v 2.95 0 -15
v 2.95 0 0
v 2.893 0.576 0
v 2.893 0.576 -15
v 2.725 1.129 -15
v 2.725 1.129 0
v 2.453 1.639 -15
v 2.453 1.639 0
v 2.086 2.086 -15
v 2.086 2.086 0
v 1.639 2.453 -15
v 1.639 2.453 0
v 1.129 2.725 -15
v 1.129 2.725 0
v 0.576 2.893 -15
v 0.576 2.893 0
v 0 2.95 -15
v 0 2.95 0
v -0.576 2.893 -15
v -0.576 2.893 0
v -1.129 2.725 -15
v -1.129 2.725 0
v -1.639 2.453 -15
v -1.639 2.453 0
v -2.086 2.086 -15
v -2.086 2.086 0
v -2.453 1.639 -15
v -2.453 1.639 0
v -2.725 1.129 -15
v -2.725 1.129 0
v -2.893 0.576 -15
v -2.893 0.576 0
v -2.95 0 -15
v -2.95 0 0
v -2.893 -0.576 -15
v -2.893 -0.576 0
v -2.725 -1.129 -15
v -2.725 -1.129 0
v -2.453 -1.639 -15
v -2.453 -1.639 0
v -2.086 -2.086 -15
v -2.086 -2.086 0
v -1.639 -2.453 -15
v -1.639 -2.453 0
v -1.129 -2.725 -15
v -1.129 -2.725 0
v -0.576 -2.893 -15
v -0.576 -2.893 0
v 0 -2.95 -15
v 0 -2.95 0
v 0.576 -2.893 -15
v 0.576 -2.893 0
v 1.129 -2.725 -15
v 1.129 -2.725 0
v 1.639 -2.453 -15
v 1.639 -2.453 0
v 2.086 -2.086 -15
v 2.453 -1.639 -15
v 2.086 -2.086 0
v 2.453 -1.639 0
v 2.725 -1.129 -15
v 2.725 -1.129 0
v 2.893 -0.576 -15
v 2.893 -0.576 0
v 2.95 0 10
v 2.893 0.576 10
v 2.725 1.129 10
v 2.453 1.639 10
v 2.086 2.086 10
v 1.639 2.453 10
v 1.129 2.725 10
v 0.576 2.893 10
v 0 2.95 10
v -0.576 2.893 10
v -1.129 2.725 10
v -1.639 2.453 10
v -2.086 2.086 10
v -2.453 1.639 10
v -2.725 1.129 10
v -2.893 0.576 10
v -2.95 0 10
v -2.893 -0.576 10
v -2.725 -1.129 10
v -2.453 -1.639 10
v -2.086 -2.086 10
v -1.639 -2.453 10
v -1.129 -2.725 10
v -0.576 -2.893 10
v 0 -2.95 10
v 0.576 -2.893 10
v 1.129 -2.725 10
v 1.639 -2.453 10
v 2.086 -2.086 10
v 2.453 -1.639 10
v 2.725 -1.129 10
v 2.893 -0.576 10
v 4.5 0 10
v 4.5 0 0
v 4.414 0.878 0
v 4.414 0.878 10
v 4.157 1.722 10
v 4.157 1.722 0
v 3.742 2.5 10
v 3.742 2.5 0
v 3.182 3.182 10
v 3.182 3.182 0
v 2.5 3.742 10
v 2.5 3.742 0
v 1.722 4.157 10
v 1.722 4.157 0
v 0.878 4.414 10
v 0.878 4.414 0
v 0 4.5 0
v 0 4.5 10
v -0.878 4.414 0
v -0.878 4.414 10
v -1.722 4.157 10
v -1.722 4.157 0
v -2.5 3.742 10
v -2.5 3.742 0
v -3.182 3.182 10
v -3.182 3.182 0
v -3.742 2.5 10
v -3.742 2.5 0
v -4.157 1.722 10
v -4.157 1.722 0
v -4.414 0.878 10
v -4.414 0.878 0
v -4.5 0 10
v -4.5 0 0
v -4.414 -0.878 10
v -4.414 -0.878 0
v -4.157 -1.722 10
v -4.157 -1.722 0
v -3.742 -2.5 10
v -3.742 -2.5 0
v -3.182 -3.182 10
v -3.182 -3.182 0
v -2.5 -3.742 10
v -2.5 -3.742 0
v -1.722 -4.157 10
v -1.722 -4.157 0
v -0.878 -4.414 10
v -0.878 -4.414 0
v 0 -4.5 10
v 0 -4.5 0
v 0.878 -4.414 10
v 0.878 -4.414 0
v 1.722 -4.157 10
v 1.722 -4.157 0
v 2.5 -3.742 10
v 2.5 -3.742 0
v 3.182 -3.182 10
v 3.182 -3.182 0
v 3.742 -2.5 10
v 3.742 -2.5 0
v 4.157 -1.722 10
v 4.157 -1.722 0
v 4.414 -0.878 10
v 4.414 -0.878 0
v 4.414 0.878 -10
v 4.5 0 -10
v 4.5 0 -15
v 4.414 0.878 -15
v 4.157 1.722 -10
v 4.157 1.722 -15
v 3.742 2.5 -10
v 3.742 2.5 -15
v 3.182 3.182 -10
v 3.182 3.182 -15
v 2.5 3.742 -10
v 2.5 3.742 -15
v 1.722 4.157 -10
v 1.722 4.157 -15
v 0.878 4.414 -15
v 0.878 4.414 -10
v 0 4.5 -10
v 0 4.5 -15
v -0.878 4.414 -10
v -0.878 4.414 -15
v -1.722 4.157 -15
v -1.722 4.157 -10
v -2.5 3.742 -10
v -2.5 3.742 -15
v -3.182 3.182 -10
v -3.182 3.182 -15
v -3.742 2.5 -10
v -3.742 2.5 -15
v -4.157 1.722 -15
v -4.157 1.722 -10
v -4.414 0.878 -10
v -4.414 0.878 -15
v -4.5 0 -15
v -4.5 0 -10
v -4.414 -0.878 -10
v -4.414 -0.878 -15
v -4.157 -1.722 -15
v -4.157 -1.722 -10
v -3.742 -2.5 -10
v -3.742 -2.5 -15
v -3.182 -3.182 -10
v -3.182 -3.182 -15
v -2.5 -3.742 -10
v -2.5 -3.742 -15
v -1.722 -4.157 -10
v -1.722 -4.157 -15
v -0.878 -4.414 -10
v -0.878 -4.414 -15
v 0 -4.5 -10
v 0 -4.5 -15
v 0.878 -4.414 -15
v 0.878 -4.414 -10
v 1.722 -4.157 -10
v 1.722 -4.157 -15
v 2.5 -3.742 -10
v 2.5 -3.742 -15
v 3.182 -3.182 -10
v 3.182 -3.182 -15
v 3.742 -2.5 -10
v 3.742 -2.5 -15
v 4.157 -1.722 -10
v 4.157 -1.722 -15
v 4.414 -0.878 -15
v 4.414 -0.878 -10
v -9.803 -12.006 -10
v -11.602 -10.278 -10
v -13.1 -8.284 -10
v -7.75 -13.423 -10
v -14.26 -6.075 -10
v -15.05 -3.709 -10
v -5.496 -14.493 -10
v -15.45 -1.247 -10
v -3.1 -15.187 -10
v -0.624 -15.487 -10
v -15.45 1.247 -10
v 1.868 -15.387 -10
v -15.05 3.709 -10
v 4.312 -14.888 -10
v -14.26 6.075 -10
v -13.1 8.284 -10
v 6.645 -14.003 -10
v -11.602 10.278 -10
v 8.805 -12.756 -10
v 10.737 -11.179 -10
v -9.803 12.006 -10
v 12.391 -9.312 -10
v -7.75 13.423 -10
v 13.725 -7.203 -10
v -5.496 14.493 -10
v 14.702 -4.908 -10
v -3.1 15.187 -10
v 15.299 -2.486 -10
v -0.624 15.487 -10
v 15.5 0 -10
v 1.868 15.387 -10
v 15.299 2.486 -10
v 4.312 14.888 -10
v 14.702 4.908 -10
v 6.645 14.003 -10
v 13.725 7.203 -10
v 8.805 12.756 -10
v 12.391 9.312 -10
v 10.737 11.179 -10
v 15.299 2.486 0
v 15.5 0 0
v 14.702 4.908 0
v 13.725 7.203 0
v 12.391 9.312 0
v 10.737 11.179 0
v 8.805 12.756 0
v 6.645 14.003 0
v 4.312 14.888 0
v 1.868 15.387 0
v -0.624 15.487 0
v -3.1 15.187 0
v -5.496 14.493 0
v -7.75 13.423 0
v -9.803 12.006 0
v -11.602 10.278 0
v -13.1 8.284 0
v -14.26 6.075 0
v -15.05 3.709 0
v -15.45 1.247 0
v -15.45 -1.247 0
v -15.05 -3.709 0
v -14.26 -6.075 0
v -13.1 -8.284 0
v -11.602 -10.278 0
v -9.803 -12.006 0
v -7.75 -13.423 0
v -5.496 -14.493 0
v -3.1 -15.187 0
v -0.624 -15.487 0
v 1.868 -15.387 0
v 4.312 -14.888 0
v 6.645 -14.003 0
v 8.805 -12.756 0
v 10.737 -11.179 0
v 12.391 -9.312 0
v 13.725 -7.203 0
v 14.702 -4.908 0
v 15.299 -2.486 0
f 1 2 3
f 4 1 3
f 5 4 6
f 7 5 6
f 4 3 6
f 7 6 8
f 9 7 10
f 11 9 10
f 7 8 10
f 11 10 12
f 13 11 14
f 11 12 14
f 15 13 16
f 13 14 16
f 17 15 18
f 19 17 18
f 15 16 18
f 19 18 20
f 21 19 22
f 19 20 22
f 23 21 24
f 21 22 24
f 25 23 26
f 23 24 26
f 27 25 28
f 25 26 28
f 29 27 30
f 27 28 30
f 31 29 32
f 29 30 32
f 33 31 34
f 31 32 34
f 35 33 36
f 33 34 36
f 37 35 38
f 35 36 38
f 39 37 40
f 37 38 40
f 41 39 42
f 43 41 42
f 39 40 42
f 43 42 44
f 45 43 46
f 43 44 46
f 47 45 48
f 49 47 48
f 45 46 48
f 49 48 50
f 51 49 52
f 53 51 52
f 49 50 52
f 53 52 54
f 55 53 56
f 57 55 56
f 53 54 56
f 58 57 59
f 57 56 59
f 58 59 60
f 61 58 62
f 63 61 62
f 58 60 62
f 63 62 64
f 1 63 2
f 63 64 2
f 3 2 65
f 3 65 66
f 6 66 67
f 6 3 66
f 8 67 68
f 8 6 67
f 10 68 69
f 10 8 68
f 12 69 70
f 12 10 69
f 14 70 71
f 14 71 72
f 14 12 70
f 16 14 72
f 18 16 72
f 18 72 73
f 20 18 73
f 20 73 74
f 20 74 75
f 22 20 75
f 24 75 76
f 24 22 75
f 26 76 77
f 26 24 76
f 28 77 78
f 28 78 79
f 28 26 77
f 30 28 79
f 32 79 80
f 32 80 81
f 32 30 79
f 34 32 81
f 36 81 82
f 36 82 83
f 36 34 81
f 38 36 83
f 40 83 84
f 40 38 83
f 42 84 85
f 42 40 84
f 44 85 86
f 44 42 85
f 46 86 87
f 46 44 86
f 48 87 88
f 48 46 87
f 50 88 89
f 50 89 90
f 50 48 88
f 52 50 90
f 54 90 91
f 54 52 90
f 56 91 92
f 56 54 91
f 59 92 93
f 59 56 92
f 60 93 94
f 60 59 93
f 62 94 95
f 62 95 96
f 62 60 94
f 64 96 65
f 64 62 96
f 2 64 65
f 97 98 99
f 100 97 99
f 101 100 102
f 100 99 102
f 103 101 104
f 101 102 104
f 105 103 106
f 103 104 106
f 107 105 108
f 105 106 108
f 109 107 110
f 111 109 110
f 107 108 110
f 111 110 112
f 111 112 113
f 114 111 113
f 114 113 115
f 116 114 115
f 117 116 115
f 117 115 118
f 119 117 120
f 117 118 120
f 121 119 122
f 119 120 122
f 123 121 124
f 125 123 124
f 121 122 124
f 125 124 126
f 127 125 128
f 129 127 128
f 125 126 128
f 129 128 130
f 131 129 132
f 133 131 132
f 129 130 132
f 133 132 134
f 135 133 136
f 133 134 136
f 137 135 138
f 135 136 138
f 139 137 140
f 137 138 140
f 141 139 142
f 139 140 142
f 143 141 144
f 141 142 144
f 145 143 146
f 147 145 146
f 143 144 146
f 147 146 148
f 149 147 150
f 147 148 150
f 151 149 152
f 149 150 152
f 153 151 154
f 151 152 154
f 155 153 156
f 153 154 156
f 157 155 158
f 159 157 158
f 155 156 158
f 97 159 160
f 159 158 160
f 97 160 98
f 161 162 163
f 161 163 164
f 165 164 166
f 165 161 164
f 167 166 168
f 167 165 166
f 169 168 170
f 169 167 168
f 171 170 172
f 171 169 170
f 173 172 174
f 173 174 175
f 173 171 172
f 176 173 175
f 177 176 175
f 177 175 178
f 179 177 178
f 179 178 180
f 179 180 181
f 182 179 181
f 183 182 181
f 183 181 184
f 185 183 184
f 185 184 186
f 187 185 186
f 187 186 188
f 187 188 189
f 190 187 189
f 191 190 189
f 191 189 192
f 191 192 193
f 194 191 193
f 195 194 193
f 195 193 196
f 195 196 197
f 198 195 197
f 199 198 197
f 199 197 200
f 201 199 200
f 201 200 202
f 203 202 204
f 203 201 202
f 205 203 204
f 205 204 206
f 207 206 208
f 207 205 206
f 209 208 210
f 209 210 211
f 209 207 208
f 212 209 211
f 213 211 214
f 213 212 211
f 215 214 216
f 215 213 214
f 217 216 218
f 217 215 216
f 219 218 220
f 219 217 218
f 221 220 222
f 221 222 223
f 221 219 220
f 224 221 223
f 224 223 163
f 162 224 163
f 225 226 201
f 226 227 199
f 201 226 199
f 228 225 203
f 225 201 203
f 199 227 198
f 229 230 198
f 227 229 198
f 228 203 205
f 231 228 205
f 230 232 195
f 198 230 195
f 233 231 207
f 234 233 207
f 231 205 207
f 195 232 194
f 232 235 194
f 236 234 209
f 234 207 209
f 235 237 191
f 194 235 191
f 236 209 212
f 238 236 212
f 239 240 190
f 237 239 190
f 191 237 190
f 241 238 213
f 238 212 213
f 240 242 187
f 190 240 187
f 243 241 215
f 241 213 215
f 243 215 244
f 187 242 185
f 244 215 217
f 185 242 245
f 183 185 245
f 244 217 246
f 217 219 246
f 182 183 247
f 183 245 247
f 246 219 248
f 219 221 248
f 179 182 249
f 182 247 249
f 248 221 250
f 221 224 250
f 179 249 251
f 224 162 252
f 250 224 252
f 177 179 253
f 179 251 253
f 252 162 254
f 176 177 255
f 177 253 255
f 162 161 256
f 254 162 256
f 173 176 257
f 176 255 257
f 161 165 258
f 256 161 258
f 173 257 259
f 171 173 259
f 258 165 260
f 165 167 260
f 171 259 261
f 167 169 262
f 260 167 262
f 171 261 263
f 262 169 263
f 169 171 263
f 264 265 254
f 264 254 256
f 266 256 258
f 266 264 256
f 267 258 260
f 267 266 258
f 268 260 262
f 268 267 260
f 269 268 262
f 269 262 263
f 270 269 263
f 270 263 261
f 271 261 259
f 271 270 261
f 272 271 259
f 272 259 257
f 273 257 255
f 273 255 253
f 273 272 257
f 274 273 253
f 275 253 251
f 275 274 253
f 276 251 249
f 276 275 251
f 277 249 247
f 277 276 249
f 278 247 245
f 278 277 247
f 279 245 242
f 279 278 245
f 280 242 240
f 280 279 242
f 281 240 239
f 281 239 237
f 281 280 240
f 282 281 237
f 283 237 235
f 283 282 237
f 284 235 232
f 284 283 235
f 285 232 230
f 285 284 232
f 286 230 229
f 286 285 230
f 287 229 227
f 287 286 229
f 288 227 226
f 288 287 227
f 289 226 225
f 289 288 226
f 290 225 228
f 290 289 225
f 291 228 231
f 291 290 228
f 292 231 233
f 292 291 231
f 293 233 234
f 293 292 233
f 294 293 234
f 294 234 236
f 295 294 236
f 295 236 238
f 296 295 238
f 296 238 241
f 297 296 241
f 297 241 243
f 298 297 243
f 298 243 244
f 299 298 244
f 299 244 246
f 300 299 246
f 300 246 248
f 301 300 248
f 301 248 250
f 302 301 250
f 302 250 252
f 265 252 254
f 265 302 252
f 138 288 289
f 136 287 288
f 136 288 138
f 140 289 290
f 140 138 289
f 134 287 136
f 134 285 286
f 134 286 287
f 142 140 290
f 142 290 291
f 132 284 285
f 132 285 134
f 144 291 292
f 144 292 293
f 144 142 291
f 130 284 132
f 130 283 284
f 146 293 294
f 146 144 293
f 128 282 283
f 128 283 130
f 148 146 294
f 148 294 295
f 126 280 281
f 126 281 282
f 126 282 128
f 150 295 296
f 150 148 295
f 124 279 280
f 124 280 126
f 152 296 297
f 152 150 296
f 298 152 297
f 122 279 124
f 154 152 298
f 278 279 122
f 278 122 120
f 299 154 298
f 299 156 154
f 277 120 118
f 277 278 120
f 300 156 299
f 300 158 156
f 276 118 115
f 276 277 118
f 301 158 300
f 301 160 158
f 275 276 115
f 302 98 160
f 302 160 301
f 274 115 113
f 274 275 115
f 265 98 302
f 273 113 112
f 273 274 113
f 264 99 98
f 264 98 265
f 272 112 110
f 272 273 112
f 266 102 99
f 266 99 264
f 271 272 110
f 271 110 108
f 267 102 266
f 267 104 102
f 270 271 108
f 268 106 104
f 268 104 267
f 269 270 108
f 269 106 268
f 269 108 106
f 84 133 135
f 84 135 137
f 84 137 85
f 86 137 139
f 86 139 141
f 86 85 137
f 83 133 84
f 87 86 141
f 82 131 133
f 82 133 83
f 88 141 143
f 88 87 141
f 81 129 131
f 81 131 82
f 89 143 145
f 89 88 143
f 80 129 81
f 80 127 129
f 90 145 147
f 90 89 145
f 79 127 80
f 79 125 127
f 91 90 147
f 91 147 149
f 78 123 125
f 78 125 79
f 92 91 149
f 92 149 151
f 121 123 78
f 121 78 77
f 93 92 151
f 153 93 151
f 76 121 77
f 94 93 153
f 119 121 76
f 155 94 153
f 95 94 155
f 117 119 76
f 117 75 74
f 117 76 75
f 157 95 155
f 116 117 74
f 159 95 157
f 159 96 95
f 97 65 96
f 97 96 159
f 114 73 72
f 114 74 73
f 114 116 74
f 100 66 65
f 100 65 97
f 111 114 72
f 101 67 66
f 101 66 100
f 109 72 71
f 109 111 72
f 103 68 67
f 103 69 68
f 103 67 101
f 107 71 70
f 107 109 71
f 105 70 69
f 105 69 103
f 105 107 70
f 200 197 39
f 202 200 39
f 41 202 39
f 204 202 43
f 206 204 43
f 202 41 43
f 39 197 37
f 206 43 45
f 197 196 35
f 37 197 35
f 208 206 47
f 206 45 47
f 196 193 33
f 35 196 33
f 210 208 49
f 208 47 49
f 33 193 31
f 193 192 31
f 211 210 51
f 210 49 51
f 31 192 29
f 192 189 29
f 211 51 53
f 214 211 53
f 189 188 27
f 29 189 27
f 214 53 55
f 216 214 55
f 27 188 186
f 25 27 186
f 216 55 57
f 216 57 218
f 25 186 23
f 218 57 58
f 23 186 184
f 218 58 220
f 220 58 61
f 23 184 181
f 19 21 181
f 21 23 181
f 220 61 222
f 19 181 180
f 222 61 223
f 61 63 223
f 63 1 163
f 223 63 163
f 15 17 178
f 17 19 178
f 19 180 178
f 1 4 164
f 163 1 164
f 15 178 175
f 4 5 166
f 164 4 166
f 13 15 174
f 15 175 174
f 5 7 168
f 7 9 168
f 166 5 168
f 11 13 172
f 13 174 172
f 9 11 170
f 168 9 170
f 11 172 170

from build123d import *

# Parameters (mm, degrees)
F0_R     = 4.5
F0_R_2   = 2.95
F1_DEPTH = 10
F0_R_3   = 15.5
F2_DEPTH = 10
F3_DEPTH = 15


with BuildPart() as f1:
    # F0 (on Top) → F1 (new body)
    with BuildSketch(Plane.XY):
        Circle(F0_R)
        Circle(F0_R_2, mode=Mode.SUBTRACT)
    extrude(amount=F1_DEPTH)

    # F0 (on Top) → F2 (join)
    with BuildSketch(Plane.XY):
        Circle(F0_R_3)
        Circle(F0_R, mode=Mode.SUBTRACT)
    extrude(amount=-F2_DEPTH)

    # F3 (add): a face of the model
    f3_faces = [f1.faces().sort_by_distance(p)[0] for p in [
        (-4.3727207794, 0, 0),
    ]]
    extrude(f3_faces, amount=F3_DEPTH)


solid = f1.part
